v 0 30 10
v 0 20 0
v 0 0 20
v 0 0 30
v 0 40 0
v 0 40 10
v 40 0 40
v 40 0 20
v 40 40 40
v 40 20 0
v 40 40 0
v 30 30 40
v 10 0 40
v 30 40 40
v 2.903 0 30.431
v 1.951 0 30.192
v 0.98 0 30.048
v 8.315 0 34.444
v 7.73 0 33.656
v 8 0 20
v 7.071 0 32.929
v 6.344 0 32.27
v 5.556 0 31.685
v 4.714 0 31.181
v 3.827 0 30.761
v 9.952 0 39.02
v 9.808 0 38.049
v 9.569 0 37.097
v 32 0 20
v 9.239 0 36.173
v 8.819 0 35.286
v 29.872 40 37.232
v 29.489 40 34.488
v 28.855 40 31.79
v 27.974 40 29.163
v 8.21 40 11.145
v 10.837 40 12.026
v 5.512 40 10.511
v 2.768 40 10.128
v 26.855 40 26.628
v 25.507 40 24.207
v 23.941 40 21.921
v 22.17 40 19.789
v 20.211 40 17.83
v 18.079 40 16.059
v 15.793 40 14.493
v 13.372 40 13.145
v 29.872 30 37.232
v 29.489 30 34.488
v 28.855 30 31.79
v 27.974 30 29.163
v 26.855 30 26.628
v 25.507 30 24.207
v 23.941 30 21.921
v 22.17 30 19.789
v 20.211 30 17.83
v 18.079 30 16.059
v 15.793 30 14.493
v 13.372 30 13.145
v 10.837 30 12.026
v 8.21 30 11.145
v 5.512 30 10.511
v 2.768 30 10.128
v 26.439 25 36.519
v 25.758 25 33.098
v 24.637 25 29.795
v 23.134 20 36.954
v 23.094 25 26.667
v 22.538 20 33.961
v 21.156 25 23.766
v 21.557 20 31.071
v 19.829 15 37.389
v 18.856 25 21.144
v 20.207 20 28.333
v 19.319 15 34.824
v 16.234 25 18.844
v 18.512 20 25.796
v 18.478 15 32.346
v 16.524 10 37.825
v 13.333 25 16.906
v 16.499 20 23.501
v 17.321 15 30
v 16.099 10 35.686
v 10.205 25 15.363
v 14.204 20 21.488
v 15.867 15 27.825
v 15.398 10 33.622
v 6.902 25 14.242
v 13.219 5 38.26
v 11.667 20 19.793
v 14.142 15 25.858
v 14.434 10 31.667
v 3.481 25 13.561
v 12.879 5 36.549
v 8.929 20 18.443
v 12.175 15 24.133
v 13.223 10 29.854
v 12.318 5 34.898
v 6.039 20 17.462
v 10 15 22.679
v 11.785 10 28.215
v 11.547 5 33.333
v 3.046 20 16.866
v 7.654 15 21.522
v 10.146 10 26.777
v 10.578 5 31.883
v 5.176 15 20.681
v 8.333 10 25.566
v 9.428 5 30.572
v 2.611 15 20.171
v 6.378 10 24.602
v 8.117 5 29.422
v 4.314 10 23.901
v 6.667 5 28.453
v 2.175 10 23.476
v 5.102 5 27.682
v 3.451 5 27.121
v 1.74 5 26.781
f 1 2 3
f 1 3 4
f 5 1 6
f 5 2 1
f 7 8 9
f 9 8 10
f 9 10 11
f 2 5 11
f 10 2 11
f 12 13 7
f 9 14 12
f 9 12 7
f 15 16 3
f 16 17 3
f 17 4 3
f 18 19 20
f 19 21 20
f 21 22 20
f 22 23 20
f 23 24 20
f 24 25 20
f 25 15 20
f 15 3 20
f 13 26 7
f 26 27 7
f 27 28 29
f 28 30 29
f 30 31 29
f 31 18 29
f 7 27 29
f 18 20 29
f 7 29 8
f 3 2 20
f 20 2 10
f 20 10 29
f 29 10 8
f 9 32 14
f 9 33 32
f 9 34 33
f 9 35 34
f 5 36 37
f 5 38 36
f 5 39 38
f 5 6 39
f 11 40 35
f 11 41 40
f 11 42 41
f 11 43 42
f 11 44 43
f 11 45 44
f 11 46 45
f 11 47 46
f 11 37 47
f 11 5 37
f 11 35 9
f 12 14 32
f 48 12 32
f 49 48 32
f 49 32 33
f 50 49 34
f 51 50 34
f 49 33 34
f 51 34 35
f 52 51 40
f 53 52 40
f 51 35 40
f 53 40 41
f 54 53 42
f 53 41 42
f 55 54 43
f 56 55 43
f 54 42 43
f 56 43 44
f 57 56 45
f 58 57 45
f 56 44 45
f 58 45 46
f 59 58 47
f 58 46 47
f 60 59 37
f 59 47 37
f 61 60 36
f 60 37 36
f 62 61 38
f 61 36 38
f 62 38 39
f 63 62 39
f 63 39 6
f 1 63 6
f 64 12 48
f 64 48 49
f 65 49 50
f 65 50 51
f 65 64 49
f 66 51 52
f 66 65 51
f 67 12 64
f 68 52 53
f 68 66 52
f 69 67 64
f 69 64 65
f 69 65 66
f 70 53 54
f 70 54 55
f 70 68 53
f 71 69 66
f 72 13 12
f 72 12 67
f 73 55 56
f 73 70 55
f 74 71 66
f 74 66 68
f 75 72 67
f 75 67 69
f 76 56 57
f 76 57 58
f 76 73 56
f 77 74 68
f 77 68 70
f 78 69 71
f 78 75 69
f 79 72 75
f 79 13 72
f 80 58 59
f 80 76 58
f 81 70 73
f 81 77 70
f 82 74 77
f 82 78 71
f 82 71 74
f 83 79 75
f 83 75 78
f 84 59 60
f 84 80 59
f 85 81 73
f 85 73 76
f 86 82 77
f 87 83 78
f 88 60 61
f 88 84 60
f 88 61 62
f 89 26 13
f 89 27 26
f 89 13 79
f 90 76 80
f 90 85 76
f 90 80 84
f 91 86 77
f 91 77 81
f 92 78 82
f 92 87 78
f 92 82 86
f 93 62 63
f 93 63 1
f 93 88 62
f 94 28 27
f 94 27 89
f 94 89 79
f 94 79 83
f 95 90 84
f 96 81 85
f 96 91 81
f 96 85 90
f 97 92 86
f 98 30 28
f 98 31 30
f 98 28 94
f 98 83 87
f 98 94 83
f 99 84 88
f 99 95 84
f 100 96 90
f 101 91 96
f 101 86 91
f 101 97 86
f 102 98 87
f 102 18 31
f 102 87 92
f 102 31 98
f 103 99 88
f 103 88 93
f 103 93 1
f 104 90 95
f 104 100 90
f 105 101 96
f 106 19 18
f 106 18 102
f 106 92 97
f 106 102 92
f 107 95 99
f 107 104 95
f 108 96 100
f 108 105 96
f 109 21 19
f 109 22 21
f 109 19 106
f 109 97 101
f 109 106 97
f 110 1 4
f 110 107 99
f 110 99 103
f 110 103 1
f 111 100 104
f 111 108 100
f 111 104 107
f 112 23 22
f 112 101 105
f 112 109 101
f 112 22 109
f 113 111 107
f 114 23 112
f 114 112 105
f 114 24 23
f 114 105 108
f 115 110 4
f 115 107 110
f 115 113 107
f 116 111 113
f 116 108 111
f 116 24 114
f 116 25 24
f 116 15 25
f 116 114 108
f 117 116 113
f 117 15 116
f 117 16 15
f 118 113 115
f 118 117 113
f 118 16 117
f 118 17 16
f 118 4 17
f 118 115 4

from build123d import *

# Parameters (mm, degrees)
SKETCH1_W           = 40
SKETCH1_H           = 40
BOSS_EXTRUDE1_DEPTH = 40
CUT_EXTRUDE1_DEPTH  = 40
CUT_EXTRUDE2_DEPTH  = 40
CUT_EXTRUDE3_DEPTH  = 10
BOSS_EXTRUDE2_DEPTH = 28
CUT_EXTRUDE11_DEPTH = 10
SKETCH20_W          = 40
SKETCH20_H          = 20
CUT_EXTRUDE12_DEPTH = 10
SKETCH21_W          = 40
SKETCH21_H          = 28.284271248
CUT_EXTRUDE13_DEPTH = 10
CUT_EXTRUDE14_DEPTH = 10
SKETCH23_W          = 40
SKETCH23_H          = 40
CUT_EXTRUDE15_DEPTH = 10
SKETCH24_W          = 40
SKETCH24_H          = 40
CUT_EXTRUDE16_DEPTH = 10
CUT_EXTRUDE17_DEPTH = 59
CUT_EXTRUDE18_DEPTH = 59


with BuildPart() as part:
    # Sketch1 → Boss-Extrude1 (new body)
    with BuildSketch(Plane.XY):
        with Locations((20, 20)):
            Rectangle(SKETCH1_W, SKETCH1_H)
    extrude(amount=BOSS_EXTRUDE1_DEPTH)

    # Sketch2 → Cut-Extrude1 (cut)
    with BuildSketch(Plane(origin=(0, 40, 0), x_dir=(1, 0, 0), z_dir=(0, 1, 0))):
        with BuildLine():
            Line((0, -30), (0, -40))
            Line((0, -40), (10, -40))
            ThreePointArc((10, -40), (7.071067812, -32.928932188), (0, -30))
        make_face()
    extrude(amount=-CUT_EXTRUDE1_DEPTH, mode=Mode.SUBTRACT)

    # Sketch3 → Cut-Extrude2 (cut)
    with BuildSketch(Plane(origin=(40, 0, 0), x_dir=(0, 0, -1), z_dir=(1, 0, 0))):
        Polygon((0, 20), (-20, 0), (0, 0), align=None)
    extrude(amount=-CUT_EXTRUDE2_DEPTH, mode=Mode.SUBTRACT)

    # Sketch4 → Cut-Extrude3 (cut)
    with BuildSketch(Plane(origin=(0, 40, 0), x_dir=(1, 0, 0), z_dir=(0, 1, 0))):
        with BuildLine():
            Line((0, -10), (0, -30))
            ThreePointArc((0, -30), (7.071067812, -32.928932188), (10, -40))
            Line((10, -40), (30, -40))
            ThreePointArc((30, -40), (21.213203436, -18.786796564), (0, -10))
        make_face()
    extrude(amount=-CUT_EXTRUDE3_DEPTH, mode=Mode.SUBTRACT)

    # Sketch8 → Boss-Extrude2 (add)
    with BuildSketch(Plane(origin=(-13.333333333, 6.666666667, 13.333333333), x_dir=(-0.745355992, -0.298142397, -0.596284794), z_dir=(0.666666667, -0.333333333, -0.666666667))):
        Polygon((-17.88854382, 31.304951685), (-17.88854382, -13.416407865), (-31.304951685, -17.88854382), (-58.137767415, 17.88854382), align=None)
    extrude(amount=BOSS_EXTRUDE2_DEPTH)

    # Sketch19 → Cut-Extrude11 (cut)
    with BuildSketch(Plane(origin=(0, 40, 0), x_dir=(1, 0, 0), z_dir=(0, 1, 0))):
        with BuildLine():
            Line((0, -10), (0, -40))
            Line((0, -40), (30, -40))
            ThreePointArc((30, -40), (21.213203436, -18.786796564), (0, -10))
        make_face()
    extrude(amount=-CUT_EXTRUDE11_DEPTH, mode=Mode.SUBTRACT)

    # Sketch20 → Cut-Extrude12 (cut)
    with BuildSketch(Plane(origin=(0, 0, 0), x_dir=(-1, 0, 0), z_dir=(0, 0, -1))):
        with Locations((-20, 30)):
            Rectangle(SKETCH20_W, SKETCH20_H)
    extrude(amount=CUT_EXTRUDE12_DEPTH, mode=Mode.SUBTRACT)

    # Sketch21 → Cut-Extrude13 (cut)
    with BuildSketch(Plane(origin=(0, 10, 10), x_dir=(1, 0, 0), z_dir=(0, -0.707106781, -0.707106781))):
        with Locations((20, 0)):
            Rectangle(SKETCH21_W, SKETCH21_H)
    extrude(amount=CUT_EXTRUDE13_DEPTH, mode=Mode.SUBTRACT)

    # Sketch22 → Cut-Extrude14 (cut)
    with BuildSketch(Plane(origin=(0, 10, -10), x_dir=(1, 0, 0), z_dir=(0, -0.707106781, 0.707106781))):
        Polygon((16, 14.142135624), (22, 14.142135624), (18.666666667, 10.999438818), align=None)
    extrude(amount=-CUT_EXTRUDE14_DEPTH, mode=Mode.SUBTRACT)

    # Sketch23 → Cut-Extrude15 (cut)
    with BuildSketch(Plane.XZ):
        with Locations((20, 20)):
            Rectangle(SKETCH23_W, SKETCH23_H)
    extrude(amount=CUT_EXTRUDE15_DEPTH, mode=Mode.SUBTRACT)

    # Sketch24 → Cut-Extrude16 (cut)
    with BuildSketch(Plane(origin=(40, 0, 0), x_dir=(0, 0, -1), z_dir=(1, 0, 0))):
        with Locations((-20, 20)):
            Rectangle(SKETCH24_W, SKETCH24_H)
    extrude(amount=CUT_EXTRUDE16_DEPTH, mode=Mode.SUBTRACT)

    # Sketch25 → Cut-Extrude17 (cut)
    with BuildSketch(Plane(origin=(-12.272727273, 8.181818182, 12.272727273), x_dir=(0.768706115, 0.354787438, 0.532181156), z_dir=(-0.639602149, 0.426401433, 0.639602149))):
        Polygon((15.965434692, -16.641005887), (15.965434692, 19.414506868), (54.992052827, 2.773500981), (28.974307403, -22.188007849), align=None)
    extrude(amount=CUT_EXTRUDE17_DEPTH, mode=Mode.SUBTRACT)

    # Sketch26 → Cut-Extrude18 (cut)
    with BuildSketch(Plane(origin=(0, 30, 0), x_dir=(1, 0, 0), z_dir=(0, 1, 0))):
        with BuildLine():
            Line((0, -30), (0, -40))
            Line((0, -40), (10, -40))
            ThreePointArc((10, -40), (7.071067812, -32.928932188), (0, -30))
        make_face()
    extrude(amount=-CUT_EXTRUDE18_DEPTH, mode=Mode.SUBTRACT)

    # Sketch27 → Cut-Revolve1 (revolve, cut)
    with BuildSketch(Plane.XY.offset(40)):
        Polygon((30, 30), (10, 0), (10, 30), align=None)
    revolve(axis=Axis((0, 0, 40), (0, 1, 0)), mode=Mode.SUBTRACT)


solid = part.part
